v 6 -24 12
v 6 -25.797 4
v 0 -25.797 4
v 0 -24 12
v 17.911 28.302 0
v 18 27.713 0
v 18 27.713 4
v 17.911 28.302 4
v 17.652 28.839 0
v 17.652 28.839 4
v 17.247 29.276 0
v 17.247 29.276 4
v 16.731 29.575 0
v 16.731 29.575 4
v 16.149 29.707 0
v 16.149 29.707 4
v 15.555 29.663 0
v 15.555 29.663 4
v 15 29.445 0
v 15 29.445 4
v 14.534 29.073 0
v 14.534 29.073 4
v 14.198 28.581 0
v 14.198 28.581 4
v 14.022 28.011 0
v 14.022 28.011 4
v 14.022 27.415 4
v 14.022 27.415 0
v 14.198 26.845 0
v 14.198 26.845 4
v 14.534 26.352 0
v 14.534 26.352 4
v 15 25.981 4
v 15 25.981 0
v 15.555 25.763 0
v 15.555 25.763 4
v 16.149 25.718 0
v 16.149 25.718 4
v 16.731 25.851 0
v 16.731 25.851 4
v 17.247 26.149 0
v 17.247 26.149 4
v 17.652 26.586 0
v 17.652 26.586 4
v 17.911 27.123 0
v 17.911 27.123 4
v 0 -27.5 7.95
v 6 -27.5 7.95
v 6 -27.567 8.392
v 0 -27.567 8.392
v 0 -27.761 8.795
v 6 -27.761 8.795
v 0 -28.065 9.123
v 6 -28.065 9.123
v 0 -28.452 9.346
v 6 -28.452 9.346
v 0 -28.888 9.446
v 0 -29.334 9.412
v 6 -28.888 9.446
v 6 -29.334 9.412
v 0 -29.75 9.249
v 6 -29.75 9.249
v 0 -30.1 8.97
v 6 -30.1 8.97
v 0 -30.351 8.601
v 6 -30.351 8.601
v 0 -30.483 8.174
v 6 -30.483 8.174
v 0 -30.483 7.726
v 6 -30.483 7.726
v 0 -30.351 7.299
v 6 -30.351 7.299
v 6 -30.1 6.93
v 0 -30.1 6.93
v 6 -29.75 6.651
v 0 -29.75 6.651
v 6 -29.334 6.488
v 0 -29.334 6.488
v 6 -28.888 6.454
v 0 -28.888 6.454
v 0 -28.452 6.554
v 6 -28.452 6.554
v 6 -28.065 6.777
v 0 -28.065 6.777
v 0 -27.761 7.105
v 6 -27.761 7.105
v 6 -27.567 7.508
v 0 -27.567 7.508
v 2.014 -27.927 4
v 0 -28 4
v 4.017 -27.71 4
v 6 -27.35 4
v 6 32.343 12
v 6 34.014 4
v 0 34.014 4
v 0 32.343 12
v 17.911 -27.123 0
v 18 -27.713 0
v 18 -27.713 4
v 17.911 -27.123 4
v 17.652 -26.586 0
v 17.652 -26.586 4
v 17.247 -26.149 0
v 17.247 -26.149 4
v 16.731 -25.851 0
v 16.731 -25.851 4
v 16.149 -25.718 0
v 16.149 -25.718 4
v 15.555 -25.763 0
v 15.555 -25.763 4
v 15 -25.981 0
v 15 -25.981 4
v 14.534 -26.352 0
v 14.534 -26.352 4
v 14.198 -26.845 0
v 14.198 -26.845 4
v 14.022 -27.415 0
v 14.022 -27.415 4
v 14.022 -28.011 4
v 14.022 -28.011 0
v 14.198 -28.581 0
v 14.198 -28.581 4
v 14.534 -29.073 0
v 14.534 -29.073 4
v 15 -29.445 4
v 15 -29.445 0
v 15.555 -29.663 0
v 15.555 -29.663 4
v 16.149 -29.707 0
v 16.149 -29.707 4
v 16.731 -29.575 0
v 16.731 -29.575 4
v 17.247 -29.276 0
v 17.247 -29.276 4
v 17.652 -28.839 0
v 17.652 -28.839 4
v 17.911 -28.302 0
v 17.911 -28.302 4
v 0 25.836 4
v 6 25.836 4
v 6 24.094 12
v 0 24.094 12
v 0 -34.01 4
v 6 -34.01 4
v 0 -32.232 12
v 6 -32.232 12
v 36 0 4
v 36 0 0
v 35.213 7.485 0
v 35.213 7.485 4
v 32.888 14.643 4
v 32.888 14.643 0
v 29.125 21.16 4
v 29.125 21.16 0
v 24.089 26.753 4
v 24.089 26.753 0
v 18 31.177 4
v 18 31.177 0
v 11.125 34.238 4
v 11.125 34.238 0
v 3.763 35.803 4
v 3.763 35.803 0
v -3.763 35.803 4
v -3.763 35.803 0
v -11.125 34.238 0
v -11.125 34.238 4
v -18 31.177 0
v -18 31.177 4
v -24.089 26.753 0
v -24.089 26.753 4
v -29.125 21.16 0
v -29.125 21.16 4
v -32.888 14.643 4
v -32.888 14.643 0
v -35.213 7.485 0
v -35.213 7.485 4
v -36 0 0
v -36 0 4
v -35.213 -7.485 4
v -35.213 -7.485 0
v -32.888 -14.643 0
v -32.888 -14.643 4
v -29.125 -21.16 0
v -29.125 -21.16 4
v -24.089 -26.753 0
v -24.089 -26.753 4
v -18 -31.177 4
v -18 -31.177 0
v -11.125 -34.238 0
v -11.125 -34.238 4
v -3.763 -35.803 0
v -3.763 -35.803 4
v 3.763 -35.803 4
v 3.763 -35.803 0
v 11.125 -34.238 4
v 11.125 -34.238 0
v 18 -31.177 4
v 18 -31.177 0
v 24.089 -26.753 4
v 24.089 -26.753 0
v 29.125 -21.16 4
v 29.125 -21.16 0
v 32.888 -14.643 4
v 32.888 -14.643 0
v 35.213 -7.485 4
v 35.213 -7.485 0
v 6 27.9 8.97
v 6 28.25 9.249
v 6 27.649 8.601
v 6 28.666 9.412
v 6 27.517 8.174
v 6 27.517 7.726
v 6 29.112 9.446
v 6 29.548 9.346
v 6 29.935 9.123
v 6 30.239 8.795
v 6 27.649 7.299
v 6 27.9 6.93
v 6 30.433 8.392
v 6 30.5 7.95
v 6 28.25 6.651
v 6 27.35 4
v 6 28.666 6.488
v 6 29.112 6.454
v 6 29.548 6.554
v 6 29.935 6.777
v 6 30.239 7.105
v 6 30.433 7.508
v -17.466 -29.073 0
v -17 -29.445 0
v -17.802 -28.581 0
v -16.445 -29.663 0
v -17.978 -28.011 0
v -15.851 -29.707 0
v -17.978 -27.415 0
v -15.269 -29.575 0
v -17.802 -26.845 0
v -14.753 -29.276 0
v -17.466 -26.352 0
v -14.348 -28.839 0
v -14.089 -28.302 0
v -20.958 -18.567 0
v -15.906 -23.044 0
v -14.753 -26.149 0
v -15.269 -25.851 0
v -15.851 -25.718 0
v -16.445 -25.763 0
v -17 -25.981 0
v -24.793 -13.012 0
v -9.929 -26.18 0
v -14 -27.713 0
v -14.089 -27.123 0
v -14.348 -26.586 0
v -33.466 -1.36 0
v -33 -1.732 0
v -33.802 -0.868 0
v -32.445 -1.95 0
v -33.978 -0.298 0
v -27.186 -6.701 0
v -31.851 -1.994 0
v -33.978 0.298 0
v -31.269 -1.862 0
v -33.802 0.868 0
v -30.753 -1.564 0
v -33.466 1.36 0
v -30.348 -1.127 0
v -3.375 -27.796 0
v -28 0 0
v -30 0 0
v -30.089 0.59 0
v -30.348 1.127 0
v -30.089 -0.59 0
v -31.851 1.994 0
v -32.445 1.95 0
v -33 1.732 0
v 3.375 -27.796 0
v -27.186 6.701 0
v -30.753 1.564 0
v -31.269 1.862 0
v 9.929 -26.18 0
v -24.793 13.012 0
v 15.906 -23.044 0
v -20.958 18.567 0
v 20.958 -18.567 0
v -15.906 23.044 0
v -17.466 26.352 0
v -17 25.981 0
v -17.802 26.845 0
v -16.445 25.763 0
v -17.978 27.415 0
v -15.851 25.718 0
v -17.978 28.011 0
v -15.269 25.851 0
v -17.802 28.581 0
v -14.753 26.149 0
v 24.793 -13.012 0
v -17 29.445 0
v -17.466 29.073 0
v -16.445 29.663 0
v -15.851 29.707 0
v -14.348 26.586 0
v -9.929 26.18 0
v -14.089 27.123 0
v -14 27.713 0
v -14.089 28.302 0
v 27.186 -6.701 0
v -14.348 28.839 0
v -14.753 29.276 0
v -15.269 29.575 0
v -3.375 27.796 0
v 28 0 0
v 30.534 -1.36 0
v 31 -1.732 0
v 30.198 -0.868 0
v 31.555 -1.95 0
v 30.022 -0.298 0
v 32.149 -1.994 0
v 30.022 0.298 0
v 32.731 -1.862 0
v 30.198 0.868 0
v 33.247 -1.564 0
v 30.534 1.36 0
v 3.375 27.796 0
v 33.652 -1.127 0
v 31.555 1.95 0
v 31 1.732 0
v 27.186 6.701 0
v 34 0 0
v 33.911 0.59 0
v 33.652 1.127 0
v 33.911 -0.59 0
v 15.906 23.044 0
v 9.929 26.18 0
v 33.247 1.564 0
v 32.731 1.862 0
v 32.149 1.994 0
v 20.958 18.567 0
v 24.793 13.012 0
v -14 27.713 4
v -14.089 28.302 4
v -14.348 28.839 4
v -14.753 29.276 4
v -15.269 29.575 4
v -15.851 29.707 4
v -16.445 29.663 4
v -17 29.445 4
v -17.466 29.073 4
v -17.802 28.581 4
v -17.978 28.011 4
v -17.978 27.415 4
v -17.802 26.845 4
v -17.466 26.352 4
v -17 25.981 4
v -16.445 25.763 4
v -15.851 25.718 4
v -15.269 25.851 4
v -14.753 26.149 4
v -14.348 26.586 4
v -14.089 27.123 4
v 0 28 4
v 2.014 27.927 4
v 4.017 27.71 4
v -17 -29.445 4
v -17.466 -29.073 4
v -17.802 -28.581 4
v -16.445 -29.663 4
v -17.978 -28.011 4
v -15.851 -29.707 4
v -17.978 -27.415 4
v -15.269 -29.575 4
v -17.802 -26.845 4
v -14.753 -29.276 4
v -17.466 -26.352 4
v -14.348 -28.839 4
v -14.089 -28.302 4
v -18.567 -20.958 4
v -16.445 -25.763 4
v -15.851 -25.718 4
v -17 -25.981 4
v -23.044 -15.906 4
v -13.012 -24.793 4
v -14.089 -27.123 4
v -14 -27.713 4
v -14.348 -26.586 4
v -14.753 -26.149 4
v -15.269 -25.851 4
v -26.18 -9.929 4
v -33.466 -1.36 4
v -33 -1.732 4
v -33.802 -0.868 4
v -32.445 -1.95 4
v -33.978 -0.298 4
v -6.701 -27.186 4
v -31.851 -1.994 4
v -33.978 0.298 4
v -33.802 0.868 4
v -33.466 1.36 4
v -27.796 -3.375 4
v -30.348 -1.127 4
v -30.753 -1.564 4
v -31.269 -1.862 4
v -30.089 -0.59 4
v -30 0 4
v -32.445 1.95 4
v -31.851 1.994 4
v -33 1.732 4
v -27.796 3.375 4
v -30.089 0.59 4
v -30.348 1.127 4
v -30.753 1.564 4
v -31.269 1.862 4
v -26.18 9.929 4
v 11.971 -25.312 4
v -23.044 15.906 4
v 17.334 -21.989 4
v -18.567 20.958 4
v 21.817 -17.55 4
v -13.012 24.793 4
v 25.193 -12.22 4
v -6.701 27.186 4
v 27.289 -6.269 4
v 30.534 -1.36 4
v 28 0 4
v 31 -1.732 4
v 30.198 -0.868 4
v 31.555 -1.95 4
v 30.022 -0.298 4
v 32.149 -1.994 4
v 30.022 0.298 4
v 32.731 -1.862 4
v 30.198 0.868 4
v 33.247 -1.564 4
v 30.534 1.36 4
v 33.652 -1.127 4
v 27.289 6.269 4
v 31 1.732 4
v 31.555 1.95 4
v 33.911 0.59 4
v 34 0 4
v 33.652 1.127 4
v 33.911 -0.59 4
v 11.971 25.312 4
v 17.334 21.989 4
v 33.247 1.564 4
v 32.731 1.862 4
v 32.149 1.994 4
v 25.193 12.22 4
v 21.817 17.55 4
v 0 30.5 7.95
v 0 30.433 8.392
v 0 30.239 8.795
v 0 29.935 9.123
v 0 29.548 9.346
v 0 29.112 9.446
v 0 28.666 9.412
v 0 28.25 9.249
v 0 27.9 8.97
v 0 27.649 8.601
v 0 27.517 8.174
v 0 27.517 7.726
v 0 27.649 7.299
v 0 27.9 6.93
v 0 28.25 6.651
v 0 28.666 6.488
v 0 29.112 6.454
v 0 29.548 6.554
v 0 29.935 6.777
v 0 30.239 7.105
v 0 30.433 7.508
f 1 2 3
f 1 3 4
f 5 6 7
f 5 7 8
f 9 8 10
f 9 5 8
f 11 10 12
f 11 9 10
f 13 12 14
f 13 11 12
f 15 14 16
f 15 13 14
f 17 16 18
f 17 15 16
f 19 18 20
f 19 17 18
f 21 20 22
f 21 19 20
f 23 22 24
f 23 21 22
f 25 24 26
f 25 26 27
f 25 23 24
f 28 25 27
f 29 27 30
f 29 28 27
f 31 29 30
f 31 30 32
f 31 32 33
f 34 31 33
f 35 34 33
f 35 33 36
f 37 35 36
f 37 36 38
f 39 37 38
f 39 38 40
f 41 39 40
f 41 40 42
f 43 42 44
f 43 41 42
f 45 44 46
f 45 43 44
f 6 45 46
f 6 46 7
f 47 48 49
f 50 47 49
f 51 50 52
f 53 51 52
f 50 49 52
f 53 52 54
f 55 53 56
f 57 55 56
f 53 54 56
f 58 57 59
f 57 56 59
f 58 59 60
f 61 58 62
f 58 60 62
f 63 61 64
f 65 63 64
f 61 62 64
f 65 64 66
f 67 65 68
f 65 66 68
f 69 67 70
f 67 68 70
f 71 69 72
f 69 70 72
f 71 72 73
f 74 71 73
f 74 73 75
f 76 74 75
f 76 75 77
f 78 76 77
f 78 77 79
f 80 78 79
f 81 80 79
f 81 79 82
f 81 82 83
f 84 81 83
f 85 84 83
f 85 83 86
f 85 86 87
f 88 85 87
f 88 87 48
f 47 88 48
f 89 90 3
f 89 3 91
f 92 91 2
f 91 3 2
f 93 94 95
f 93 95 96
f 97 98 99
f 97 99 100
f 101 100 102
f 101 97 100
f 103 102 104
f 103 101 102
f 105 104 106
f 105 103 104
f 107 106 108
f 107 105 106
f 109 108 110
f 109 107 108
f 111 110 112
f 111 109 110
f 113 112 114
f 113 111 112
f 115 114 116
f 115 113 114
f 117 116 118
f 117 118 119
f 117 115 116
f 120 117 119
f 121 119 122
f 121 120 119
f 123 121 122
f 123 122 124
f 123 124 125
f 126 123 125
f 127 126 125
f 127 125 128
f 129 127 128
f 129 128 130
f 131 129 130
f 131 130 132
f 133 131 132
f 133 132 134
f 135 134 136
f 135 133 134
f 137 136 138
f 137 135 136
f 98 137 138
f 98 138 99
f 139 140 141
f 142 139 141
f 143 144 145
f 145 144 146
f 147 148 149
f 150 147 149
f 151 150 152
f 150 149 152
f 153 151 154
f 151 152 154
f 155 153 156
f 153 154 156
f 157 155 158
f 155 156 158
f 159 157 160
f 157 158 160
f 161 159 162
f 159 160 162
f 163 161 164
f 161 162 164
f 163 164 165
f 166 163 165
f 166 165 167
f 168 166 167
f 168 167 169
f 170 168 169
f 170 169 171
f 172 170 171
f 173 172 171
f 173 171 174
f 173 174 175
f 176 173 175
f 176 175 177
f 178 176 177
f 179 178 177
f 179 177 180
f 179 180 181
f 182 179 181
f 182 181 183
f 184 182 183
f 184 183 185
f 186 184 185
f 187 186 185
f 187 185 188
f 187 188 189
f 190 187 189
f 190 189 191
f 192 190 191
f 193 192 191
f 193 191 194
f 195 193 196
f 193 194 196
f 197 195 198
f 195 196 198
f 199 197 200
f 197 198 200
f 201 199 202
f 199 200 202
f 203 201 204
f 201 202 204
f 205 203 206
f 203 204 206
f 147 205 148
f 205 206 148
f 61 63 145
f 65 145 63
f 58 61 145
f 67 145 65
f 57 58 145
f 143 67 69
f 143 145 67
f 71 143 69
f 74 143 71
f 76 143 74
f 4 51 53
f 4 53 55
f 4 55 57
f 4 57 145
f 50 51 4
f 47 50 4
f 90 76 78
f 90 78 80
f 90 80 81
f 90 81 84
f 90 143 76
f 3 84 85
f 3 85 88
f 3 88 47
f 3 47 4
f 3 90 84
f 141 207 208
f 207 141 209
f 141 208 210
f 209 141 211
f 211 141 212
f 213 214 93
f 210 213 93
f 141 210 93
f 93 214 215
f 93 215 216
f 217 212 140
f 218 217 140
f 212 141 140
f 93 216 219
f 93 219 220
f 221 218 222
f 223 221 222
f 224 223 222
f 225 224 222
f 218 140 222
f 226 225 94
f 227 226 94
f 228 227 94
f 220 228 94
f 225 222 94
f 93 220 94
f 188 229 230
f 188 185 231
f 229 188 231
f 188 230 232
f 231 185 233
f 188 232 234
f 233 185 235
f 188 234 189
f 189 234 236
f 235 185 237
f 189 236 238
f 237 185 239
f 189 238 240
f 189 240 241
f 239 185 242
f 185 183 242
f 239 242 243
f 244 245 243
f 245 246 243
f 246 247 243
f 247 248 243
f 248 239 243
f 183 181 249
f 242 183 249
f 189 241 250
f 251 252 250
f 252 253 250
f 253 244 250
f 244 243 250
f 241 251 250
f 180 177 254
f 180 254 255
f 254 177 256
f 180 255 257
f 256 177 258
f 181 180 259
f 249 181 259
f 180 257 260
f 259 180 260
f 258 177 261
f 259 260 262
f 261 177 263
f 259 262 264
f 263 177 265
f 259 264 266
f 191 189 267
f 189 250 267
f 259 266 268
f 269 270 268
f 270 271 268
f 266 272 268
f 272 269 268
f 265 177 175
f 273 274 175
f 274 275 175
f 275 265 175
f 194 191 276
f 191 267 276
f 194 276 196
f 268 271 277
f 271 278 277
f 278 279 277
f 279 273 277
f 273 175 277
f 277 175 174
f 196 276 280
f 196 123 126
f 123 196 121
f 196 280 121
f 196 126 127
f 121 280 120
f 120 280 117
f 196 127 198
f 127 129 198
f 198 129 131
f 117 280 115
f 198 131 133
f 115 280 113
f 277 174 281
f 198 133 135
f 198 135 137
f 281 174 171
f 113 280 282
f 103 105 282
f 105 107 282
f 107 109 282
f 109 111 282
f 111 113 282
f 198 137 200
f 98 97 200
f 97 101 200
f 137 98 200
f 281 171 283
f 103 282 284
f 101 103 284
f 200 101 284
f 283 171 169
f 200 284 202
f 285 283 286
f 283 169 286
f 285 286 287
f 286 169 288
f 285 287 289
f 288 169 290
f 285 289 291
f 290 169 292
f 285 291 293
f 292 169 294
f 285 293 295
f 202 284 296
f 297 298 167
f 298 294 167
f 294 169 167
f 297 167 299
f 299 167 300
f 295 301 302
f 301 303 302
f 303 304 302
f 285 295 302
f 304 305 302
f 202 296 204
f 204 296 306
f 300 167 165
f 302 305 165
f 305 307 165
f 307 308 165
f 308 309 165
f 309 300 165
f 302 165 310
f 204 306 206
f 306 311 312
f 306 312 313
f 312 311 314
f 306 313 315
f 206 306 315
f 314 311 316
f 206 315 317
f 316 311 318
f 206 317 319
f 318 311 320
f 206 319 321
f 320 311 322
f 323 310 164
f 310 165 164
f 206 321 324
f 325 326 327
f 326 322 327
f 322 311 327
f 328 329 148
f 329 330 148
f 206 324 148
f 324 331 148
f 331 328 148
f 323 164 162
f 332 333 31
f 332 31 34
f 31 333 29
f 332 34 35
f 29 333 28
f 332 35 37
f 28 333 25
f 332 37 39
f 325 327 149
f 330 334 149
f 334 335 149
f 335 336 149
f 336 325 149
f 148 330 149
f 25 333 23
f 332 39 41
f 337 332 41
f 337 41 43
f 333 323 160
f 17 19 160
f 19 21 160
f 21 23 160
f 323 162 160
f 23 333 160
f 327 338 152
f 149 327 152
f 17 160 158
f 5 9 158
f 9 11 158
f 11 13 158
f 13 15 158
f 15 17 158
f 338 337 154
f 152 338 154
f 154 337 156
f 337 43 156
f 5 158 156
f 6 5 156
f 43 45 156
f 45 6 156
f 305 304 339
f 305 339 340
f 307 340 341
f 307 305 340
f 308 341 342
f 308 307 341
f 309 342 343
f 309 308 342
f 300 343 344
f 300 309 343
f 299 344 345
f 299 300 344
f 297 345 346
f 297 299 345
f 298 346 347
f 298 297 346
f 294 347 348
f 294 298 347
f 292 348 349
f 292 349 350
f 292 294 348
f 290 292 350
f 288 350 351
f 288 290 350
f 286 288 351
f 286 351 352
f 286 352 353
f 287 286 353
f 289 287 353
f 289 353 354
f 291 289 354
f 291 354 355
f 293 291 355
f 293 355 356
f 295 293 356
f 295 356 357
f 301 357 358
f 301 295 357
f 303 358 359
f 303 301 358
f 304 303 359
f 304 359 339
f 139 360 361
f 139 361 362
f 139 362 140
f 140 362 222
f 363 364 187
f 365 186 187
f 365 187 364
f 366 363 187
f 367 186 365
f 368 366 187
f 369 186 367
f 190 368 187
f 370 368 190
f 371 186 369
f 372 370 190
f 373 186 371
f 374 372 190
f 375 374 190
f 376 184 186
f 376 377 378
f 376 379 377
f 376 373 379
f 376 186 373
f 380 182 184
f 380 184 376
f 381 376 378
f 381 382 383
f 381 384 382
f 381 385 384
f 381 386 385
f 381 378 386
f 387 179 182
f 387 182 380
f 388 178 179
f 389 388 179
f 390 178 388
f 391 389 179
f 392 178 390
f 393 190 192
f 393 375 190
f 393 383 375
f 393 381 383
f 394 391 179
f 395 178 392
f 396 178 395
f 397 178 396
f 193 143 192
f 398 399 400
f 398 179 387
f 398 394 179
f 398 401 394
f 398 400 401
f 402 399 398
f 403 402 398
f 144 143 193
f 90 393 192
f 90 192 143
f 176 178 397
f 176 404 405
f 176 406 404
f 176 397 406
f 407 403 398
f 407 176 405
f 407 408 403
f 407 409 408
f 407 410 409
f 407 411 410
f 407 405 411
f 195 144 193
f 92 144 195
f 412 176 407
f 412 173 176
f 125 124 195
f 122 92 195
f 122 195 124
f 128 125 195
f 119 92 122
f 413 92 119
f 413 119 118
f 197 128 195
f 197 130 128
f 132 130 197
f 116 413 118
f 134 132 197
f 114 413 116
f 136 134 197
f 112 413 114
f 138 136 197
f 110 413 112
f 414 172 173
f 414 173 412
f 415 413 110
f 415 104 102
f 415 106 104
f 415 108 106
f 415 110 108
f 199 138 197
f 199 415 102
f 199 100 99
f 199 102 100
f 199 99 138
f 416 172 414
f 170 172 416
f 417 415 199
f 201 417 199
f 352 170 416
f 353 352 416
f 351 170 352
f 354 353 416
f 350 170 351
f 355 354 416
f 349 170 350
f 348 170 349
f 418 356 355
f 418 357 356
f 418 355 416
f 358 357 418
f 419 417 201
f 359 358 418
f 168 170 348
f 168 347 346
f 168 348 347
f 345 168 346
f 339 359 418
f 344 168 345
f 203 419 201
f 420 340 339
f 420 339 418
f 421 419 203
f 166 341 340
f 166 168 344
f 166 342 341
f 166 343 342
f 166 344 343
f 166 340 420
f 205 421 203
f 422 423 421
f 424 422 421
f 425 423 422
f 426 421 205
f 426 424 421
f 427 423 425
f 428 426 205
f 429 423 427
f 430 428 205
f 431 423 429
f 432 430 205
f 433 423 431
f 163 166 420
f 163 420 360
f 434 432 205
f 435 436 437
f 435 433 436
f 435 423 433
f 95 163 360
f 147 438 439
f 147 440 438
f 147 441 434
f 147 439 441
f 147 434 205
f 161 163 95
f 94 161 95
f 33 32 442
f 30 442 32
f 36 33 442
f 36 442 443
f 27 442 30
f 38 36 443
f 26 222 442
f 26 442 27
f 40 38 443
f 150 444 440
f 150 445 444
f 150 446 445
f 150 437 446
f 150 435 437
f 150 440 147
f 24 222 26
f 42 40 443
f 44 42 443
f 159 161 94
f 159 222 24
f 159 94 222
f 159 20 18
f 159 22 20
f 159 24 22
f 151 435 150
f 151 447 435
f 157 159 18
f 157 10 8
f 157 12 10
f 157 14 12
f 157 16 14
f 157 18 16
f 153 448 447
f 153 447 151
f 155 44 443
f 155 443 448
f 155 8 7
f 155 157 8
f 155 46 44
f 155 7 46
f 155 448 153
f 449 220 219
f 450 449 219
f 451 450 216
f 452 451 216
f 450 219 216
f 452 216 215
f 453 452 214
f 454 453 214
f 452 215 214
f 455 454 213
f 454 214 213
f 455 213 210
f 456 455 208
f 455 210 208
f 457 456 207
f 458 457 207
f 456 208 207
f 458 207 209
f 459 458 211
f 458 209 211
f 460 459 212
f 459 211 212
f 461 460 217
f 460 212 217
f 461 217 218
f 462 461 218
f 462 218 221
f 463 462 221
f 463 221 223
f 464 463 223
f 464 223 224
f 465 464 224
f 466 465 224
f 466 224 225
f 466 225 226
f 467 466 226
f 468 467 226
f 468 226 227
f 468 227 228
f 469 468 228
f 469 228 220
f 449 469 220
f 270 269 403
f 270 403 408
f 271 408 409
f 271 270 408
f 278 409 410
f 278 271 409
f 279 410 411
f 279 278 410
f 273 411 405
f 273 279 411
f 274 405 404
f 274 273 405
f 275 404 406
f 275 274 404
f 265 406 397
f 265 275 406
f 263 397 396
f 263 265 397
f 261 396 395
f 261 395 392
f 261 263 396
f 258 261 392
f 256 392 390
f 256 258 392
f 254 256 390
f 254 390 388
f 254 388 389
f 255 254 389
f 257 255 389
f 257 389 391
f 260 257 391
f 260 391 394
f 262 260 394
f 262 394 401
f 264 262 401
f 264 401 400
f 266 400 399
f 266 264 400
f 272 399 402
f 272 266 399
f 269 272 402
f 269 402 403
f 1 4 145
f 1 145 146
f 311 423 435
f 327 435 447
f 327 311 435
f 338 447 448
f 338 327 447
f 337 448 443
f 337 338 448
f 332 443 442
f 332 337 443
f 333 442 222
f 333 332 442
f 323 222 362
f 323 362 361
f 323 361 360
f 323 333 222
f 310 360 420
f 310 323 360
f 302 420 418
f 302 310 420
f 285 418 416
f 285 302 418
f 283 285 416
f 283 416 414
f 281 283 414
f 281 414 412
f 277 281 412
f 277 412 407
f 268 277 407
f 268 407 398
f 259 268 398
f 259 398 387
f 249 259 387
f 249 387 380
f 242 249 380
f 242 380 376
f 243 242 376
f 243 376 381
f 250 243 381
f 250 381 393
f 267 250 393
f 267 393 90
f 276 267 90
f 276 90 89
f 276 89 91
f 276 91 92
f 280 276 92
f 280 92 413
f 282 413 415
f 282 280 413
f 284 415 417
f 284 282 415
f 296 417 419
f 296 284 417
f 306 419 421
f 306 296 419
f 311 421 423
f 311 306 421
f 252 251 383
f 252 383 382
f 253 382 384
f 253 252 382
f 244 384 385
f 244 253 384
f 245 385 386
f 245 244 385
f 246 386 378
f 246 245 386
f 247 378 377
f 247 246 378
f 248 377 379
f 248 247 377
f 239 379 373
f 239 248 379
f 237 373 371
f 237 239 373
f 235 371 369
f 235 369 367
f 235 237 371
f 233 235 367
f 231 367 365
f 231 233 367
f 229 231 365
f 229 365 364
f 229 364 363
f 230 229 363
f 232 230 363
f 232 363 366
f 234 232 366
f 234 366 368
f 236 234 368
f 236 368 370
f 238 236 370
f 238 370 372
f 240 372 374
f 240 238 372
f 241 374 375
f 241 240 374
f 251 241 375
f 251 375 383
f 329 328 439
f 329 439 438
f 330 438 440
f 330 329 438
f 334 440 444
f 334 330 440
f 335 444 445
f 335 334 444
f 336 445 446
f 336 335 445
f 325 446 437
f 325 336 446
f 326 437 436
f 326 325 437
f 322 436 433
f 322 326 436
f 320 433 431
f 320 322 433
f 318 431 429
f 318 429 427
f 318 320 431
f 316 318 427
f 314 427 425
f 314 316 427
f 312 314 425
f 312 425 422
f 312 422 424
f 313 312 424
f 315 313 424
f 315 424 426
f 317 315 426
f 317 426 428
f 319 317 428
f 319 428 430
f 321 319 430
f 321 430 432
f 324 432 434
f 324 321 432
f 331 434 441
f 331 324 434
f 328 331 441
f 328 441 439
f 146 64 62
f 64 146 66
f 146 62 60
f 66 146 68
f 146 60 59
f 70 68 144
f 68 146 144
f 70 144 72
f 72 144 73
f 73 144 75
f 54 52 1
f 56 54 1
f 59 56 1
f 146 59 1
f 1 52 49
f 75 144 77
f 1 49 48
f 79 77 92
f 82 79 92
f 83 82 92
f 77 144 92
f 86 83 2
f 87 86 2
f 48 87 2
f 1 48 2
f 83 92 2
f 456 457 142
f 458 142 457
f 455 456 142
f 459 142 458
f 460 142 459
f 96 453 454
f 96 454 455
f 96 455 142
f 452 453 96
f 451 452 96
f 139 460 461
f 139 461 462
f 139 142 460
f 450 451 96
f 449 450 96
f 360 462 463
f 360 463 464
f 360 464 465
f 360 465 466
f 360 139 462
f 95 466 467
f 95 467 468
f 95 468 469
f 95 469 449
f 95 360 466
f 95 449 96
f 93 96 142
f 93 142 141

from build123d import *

# Parameters (mm, degrees)
SKETCH019_R     = 36
SKETCH019_R_2   = 28
SKETCH019_R_3   = 2
PAD003_DEPTH    = 4
SKETCH037_W     = 6
SKETCH037_H     = 12
PAD015_DEPTH    = 8
POCKET018_DEPTH = 8
SKETCH039_R     = 1.5
POCKET019_DEPTH = 9


with BuildPart() as part:
    # Sketch019 → Pad003 (new body)
    with BuildSketch(Plane.XY):
        Circle(SKETCH019_R)
        Circle(SKETCH019_R_2, mode=Mode.SUBTRACT)
        with Locations((-16, 27.712813)):
            Circle(SKETCH019_R_3, mode=Mode.SUBTRACT)
        with Locations((16, 27.712813)):
            Circle(SKETCH019_R_3, mode=Mode.SUBTRACT)
        with Locations((32, 0)):
            Circle(SKETCH019_R_3, mode=Mode.SUBTRACT)
        with Locations((16, -27.712813)):
            Circle(SKETCH019_R_3, mode=Mode.SUBTRACT)
        with Locations((-16, -27.712813)):
            Circle(SKETCH019_R_3, mode=Mode.SUBTRACT)
        with Locations((-32, 0)):
            Circle(SKETCH019_R_3, mode=Mode.SUBTRACT)
    extrude(amount=PAD003_DEPTH)

    # Sketch037 (on Face10 of Pad003) → Pad015 (join)
    with BuildSketch(Plane.XY.offset(4)):
        with Locations((3, 29.496479)):
            Rectangle(SKETCH037_W, SKETCH037_H)
        with Locations((3, -30)):
            Rectangle(SKETCH037_W, SKETCH037_H)
    extrude(amount=PAD015_DEPTH)

    # Sketch038 (on Face14 of Pad015) → Pocket018 (cut)
    with BuildSketch(Plane.YZ.offset(6)):
        Polygon((35.496479, 4), (34.014362, 4), (32.343197, 12), (35.496479, 12), align=None)
        Polygon((23.496479, 4), (25.836313, 4), (24.094032, 12), (23.496479, 12), align=None)
        Polygon((-24, 4), (-25.796526, 4), (-24, 12), align=None)
        Polygon((-36, 4), (-34.010136, 4), (-32.232297, 12), (-36, 12), align=None)
    extrude(amount=-POCKET018_DEPTH, mode=Mode.SUBTRACT)

    # Sketch039 (on Face10 of Pocket018) → Pocket019 (cut)
    with BuildSketch(Plane.YZ.offset(6)):
        with Locations((-29, 7.95)):
            Circle(SKETCH039_R)
        with Locations((29, 7.95)):
            Circle(SKETCH039_R)
    extrude(amount=-POCKET019_DEPTH, mode=Mode.SUBTRACT)


solid = part.part
